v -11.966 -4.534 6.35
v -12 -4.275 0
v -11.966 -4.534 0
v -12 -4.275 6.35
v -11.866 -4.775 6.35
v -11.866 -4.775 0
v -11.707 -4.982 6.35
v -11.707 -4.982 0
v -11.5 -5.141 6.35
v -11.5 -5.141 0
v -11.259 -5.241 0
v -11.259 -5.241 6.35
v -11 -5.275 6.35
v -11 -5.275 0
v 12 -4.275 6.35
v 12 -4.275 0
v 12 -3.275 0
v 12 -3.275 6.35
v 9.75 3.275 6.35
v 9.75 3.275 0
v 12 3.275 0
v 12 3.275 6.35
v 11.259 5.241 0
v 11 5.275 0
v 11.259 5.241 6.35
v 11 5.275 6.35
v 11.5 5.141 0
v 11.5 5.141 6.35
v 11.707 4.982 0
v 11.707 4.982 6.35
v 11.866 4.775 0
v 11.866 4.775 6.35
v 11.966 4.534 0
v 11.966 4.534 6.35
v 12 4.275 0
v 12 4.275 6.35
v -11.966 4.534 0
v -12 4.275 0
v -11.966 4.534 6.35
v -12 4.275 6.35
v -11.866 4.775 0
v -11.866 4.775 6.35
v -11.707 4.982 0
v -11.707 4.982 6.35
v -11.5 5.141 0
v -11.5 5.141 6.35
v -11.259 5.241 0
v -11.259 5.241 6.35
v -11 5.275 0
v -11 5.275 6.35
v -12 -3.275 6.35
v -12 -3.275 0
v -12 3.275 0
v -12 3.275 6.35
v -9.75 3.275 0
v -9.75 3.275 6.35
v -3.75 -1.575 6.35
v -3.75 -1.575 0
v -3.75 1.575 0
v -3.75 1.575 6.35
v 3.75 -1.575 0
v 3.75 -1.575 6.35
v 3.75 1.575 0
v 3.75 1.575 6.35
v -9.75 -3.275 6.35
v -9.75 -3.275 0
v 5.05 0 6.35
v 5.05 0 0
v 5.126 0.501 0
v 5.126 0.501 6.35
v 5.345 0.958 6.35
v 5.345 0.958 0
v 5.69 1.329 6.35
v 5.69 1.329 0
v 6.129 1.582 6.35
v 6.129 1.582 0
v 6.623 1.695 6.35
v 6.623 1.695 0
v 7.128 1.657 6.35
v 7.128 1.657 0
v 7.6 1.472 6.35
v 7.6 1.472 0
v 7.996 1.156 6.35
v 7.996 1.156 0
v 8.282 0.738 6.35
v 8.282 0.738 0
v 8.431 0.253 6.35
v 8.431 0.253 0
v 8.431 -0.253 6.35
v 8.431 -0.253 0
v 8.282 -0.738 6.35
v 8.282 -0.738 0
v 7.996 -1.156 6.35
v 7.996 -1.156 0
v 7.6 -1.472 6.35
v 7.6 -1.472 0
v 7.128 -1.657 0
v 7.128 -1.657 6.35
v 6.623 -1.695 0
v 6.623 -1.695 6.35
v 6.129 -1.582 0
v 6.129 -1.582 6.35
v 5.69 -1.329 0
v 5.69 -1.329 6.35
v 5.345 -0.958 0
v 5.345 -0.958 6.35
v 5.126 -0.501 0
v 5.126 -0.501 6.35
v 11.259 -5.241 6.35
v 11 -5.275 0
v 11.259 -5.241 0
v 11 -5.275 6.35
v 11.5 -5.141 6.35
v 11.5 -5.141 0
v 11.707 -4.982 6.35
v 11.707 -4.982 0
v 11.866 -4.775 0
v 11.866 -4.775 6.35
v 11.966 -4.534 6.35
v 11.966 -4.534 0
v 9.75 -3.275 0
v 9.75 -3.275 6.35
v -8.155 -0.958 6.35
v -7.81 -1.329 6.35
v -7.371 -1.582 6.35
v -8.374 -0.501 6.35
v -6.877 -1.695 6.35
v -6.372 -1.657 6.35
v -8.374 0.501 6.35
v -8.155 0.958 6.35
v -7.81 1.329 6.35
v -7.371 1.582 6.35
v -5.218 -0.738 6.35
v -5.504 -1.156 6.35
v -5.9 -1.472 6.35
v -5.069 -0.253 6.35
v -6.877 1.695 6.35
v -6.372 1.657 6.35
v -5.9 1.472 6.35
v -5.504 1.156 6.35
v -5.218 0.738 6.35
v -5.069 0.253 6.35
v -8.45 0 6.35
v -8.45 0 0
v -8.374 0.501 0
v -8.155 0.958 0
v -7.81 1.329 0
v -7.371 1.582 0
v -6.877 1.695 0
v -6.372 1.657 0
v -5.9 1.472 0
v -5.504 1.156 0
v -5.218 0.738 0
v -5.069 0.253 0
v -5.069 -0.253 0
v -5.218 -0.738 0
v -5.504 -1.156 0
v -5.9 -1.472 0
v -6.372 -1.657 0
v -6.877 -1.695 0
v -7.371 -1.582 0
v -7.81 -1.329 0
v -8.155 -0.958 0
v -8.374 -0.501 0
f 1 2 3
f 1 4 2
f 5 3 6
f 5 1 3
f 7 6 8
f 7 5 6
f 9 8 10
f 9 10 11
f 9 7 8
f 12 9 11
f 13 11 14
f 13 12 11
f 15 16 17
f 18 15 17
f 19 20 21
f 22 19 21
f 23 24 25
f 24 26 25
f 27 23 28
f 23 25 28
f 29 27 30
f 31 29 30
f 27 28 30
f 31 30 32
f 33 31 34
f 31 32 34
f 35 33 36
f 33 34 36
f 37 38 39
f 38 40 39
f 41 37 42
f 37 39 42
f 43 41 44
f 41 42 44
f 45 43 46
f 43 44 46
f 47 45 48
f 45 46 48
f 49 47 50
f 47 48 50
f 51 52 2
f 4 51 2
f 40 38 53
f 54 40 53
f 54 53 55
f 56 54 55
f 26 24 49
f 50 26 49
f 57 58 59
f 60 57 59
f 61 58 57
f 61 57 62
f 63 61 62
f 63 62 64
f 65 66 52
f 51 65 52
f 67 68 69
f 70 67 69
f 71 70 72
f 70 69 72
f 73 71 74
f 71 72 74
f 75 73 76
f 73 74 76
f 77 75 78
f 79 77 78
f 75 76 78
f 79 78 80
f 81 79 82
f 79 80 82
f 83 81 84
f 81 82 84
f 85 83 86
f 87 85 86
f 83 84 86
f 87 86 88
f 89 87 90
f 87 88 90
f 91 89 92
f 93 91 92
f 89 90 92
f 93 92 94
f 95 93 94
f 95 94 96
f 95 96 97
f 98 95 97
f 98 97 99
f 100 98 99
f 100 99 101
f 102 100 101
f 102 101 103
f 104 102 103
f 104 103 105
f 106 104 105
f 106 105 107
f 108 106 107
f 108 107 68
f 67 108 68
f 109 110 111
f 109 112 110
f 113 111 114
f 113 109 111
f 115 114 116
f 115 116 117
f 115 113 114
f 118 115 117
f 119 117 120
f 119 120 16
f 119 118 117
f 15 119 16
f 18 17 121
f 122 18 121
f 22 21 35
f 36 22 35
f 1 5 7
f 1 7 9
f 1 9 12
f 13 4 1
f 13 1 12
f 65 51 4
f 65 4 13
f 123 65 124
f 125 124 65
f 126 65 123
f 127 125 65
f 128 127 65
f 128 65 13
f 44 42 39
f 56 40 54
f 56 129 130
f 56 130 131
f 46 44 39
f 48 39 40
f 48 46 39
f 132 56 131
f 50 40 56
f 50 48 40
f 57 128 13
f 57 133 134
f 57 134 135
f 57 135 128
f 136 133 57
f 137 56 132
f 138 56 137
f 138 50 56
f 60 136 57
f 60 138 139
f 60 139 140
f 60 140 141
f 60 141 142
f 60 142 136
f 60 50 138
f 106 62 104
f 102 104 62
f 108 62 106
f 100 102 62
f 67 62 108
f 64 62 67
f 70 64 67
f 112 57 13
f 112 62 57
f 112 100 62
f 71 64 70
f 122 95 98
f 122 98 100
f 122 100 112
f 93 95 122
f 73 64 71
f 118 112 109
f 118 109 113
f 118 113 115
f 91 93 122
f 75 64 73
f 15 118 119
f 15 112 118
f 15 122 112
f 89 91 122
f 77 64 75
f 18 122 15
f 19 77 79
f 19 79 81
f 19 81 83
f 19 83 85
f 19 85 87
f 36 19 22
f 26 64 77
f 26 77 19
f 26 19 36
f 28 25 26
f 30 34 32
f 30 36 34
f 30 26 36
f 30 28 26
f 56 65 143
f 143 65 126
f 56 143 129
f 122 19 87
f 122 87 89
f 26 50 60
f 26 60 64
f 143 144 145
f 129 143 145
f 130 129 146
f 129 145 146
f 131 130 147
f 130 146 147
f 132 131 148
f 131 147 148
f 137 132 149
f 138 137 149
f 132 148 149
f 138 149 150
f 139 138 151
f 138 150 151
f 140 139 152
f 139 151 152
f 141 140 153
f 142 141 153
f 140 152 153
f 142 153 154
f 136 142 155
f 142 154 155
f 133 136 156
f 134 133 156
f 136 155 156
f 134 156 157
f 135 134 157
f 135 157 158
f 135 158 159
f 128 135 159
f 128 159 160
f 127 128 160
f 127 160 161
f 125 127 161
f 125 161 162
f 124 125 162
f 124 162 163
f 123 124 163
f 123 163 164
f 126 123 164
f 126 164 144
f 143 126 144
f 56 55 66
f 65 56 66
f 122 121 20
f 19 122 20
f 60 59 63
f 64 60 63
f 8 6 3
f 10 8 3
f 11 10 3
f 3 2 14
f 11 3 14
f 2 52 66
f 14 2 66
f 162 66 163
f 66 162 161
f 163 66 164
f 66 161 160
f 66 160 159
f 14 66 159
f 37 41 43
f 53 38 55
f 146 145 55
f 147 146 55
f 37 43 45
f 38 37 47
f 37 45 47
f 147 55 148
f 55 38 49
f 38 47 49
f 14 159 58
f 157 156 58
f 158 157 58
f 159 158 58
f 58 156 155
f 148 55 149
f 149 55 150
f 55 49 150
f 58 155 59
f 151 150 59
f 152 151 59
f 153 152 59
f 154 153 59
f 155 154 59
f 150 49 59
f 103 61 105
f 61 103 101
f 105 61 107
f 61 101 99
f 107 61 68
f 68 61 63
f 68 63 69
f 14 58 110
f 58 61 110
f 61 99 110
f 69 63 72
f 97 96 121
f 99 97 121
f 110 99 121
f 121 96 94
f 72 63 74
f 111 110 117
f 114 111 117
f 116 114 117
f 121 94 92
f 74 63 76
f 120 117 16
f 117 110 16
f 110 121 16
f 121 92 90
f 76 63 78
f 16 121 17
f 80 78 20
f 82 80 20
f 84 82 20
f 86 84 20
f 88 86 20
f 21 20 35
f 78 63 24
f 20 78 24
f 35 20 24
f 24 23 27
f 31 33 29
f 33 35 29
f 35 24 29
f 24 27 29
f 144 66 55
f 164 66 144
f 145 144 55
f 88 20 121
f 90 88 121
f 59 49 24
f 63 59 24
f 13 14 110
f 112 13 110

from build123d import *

# Parameters (mm, degrees)
SKETCH1_W            = 7.5
SKETCH1_H            = 3.15
BOSS_EXTRUDE1_DEPTH  = 6.35
M3_CLEARANCE_HOLE1_D = 3.4
FILLET1_R            = 1


with BuildPart() as part:
    # Sketch1 → Boss-Extrude1 (new body)
    with BuildSketch(Plane.XY):
        Polygon((-12, 3.275), (-9.75, 3.275), (-9.75, -3.275), (-12, -3.275), (-12, -5.275), (12, -5.275), (12, -3.275), (9.75, -3.275), (9.75, 3.275), (12, 3.275), (12, 5.275), (-12, 5.275), align=None)
        Rectangle(SKETCH1_W, SKETCH1_H, mode=Mode.SUBTRACT)
    extrude(amount=BOSS_EXTRUDE1_DEPTH)

    # M3 Clearance Hole1 (through all)
    with Locations(Plane.XY.offset(6.35)):
        with Locations((-6.75, 0), (6.75, 0)):
            Hole(M3_CLEARANCE_HOLE1_D / 2)

    # Fillet1
    fillet1_edges = [part.edges().sort_by_distance(p)[0] for p in [
        (-12, 5.275, 3.175),
        (12, 5.275, 3.175),
        (12, -5.275, 3.175),
        (-12, -5.275, 3.175),
    ]]
    fillet(fillet1_edges, radius=FILLET1_R)


solid = part.part
